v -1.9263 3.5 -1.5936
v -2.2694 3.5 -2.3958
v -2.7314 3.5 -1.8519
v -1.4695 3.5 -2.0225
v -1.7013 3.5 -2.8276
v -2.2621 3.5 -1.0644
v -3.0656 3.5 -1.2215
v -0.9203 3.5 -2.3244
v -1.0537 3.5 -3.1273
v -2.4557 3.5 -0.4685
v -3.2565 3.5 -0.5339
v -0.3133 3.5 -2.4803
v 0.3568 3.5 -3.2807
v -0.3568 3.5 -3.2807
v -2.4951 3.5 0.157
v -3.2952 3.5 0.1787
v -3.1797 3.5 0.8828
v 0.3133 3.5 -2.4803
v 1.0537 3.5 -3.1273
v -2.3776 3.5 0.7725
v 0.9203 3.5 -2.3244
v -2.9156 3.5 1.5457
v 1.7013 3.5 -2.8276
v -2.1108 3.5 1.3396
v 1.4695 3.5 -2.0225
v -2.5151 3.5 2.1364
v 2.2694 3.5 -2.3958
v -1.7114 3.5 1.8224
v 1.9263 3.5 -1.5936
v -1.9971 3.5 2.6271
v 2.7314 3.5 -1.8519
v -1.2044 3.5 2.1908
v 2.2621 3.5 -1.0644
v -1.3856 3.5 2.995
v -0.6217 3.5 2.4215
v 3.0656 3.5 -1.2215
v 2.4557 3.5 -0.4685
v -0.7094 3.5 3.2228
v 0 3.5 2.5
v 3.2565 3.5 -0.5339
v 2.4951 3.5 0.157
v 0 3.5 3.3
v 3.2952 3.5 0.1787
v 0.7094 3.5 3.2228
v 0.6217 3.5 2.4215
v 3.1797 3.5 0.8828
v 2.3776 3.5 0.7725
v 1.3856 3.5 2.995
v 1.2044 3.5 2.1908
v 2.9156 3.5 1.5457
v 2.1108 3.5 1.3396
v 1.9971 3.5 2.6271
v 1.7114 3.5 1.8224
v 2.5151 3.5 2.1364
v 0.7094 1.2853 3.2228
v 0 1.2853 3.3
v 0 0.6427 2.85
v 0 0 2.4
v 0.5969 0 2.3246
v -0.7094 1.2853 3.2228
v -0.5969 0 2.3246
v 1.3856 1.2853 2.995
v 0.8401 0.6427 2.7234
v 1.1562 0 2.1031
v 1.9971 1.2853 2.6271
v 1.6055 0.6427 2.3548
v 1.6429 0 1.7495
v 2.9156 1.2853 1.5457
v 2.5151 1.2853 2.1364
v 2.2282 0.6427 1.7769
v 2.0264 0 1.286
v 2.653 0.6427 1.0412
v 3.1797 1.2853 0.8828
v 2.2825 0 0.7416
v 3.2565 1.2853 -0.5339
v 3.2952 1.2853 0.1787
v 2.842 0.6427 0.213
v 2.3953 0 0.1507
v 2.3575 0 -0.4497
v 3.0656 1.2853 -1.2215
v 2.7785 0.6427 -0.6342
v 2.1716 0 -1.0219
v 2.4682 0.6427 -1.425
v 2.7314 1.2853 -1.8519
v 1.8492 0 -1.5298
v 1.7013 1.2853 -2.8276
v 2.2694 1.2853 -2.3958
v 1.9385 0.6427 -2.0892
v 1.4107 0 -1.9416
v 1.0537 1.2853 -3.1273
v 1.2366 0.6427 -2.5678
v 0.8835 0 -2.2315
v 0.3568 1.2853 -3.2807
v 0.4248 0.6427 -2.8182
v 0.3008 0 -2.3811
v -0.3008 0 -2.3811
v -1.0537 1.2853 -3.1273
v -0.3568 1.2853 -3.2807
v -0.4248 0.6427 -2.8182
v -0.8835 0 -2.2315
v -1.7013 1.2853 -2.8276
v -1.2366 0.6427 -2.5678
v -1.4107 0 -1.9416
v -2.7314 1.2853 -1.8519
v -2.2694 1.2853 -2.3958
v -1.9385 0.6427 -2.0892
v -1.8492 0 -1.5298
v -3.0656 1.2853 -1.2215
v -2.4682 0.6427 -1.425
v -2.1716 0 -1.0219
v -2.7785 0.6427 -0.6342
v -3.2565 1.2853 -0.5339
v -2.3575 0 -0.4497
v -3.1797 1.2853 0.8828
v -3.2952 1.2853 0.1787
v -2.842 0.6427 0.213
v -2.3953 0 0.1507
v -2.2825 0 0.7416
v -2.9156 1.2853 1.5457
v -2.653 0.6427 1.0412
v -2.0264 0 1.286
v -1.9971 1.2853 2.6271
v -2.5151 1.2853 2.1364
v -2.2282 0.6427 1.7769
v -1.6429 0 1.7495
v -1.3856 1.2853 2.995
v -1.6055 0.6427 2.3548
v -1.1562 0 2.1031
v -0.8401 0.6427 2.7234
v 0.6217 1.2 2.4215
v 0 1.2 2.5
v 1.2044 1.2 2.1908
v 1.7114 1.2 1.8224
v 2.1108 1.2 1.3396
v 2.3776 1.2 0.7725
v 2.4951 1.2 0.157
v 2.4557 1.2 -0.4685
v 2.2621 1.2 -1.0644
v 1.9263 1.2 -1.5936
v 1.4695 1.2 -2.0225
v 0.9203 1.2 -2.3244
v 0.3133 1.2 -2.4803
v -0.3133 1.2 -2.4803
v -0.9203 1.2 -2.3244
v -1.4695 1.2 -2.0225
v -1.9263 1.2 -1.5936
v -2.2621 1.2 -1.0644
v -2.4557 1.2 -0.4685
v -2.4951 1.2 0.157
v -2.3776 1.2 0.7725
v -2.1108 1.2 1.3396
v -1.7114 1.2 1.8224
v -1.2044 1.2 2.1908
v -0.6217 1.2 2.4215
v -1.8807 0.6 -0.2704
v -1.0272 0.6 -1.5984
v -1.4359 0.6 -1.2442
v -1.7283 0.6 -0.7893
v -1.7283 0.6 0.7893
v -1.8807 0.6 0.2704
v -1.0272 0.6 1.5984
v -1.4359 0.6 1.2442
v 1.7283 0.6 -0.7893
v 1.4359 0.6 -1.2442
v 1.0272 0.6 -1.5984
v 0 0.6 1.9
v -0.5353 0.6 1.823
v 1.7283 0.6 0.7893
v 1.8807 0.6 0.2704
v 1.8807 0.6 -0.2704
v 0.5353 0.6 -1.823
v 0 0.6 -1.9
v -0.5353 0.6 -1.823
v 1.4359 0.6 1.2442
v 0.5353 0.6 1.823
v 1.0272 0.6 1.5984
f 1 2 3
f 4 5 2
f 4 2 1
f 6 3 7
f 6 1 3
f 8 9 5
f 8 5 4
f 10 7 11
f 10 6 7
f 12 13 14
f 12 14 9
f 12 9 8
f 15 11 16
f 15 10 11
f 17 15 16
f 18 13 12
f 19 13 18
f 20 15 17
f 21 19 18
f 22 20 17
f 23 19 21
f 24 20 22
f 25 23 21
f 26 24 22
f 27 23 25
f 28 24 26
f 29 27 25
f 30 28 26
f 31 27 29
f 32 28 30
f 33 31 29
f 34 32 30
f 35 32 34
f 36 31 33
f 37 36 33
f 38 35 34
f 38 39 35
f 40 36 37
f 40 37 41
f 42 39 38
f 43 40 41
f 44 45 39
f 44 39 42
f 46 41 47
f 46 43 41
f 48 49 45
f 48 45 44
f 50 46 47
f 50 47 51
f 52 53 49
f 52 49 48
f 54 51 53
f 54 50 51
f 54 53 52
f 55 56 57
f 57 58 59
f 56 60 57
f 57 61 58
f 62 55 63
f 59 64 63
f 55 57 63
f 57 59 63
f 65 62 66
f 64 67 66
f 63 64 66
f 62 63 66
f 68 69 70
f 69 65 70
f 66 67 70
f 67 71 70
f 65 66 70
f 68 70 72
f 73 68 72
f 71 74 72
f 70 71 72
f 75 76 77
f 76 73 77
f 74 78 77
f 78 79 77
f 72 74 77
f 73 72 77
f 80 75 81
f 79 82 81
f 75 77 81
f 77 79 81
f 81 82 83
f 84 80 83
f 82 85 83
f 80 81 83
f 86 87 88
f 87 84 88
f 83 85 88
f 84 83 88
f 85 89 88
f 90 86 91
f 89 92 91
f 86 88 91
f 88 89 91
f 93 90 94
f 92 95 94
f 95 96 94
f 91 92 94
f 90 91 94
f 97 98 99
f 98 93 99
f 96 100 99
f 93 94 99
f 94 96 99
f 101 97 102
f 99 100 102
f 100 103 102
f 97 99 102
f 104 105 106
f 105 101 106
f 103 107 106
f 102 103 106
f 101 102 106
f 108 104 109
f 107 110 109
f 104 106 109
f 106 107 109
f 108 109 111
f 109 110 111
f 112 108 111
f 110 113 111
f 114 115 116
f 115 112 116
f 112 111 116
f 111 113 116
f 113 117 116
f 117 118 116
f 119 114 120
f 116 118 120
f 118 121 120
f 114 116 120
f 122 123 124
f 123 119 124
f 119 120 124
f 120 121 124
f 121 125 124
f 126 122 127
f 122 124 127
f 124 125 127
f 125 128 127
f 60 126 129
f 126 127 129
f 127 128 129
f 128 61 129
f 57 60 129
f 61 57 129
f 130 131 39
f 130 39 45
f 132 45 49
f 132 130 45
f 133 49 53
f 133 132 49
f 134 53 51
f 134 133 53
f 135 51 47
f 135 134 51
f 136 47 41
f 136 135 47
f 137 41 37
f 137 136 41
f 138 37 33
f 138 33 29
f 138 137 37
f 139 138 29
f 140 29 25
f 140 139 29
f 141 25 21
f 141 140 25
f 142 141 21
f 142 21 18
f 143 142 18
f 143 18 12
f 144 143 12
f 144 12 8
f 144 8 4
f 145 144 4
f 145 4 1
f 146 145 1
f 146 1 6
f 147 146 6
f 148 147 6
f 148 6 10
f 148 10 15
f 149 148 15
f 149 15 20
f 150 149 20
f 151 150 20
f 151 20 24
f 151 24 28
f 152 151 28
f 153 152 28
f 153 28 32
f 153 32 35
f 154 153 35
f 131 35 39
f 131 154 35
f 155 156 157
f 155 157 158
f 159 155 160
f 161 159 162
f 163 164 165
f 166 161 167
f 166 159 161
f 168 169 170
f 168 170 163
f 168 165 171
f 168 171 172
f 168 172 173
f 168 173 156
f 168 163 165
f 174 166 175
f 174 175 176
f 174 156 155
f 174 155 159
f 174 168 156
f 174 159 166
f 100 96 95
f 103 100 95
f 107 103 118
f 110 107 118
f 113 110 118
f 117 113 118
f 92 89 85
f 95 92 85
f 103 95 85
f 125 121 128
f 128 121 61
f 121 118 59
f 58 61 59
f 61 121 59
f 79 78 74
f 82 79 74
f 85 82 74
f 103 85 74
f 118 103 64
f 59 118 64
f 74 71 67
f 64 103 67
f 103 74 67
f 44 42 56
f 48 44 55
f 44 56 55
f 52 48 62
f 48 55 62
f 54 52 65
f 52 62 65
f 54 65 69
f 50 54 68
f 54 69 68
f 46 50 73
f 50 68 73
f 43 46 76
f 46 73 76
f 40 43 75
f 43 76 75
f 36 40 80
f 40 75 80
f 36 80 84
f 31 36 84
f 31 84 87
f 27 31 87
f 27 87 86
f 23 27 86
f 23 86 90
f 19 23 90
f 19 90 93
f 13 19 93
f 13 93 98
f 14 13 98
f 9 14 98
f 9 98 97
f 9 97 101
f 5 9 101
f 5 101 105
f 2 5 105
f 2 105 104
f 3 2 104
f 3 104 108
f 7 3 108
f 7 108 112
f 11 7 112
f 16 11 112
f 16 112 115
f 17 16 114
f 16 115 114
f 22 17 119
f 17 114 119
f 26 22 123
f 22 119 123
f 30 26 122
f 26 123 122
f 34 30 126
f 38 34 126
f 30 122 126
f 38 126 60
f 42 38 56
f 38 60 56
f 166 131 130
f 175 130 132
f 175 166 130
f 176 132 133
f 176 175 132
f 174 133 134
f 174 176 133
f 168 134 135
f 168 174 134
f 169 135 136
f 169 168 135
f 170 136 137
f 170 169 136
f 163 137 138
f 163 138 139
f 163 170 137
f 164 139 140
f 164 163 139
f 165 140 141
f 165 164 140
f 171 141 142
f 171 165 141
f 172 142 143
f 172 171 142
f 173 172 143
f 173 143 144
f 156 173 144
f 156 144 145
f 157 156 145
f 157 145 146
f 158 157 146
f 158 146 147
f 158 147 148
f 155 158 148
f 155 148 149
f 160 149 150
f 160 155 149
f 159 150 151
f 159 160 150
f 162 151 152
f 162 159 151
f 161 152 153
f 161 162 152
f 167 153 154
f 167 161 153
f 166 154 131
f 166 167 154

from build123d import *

# Parameters (mm, degrees)
SKETCH1_R           = 3.3
SKETCH1_R_2         = 2.5
BOSS_EXTRUDE1_DEPTH = 3.5
SKETCH1_2_R         = 2.5
BOSS_EXTRUDE2_DEPTH = 0.6


with BuildPart() as part:
    # Sketch1 → Boss-Extrude1 (new body)
    with BuildSketch(Plane(origin=(0, 0, 0), x_dir=(1, 0, 0), z_dir=(0, 1, 0))):
        Circle(SKETCH1_R)
        Circle(SKETCH1_R_2, mode=Mode.SUBTRACT)
    extrude(amount=BOSS_EXTRUDE1_DEPTH)

    # Sketch1<2> → Boss-Extrude2 (add)
    with BuildSketch(Plane(origin=(0, 0, 0), x_dir=(1, 0, 0), z_dir=(0, 1, 0))):
        Circle(SKETCH1_2_R)
    extrude(amount=BOSS_EXTRUDE2_DEPTH)

    # Sketch2 → Revolve1 (revolve)
    with BuildSketch(Plane.XY):
        Polygon((1.9, 0.6), (2.5, 0.6), (2.5, 1.2), align=None)
    revolve(axis=Axis((0, 0, 0), (0, 1, 0)))

    # Sketch3 → Cut-Revolve2 (revolve, cut)
    with BuildSketch(Plane.XY):
        Polygon((3.743125207, 0), (3.743125207, 1.918181588), (2.4, 0), align=None)
    revolve(axis=Axis((0, 0, 0), (0, 1, 0)), mode=Mode.SUBTRACT)


solid = part.part
